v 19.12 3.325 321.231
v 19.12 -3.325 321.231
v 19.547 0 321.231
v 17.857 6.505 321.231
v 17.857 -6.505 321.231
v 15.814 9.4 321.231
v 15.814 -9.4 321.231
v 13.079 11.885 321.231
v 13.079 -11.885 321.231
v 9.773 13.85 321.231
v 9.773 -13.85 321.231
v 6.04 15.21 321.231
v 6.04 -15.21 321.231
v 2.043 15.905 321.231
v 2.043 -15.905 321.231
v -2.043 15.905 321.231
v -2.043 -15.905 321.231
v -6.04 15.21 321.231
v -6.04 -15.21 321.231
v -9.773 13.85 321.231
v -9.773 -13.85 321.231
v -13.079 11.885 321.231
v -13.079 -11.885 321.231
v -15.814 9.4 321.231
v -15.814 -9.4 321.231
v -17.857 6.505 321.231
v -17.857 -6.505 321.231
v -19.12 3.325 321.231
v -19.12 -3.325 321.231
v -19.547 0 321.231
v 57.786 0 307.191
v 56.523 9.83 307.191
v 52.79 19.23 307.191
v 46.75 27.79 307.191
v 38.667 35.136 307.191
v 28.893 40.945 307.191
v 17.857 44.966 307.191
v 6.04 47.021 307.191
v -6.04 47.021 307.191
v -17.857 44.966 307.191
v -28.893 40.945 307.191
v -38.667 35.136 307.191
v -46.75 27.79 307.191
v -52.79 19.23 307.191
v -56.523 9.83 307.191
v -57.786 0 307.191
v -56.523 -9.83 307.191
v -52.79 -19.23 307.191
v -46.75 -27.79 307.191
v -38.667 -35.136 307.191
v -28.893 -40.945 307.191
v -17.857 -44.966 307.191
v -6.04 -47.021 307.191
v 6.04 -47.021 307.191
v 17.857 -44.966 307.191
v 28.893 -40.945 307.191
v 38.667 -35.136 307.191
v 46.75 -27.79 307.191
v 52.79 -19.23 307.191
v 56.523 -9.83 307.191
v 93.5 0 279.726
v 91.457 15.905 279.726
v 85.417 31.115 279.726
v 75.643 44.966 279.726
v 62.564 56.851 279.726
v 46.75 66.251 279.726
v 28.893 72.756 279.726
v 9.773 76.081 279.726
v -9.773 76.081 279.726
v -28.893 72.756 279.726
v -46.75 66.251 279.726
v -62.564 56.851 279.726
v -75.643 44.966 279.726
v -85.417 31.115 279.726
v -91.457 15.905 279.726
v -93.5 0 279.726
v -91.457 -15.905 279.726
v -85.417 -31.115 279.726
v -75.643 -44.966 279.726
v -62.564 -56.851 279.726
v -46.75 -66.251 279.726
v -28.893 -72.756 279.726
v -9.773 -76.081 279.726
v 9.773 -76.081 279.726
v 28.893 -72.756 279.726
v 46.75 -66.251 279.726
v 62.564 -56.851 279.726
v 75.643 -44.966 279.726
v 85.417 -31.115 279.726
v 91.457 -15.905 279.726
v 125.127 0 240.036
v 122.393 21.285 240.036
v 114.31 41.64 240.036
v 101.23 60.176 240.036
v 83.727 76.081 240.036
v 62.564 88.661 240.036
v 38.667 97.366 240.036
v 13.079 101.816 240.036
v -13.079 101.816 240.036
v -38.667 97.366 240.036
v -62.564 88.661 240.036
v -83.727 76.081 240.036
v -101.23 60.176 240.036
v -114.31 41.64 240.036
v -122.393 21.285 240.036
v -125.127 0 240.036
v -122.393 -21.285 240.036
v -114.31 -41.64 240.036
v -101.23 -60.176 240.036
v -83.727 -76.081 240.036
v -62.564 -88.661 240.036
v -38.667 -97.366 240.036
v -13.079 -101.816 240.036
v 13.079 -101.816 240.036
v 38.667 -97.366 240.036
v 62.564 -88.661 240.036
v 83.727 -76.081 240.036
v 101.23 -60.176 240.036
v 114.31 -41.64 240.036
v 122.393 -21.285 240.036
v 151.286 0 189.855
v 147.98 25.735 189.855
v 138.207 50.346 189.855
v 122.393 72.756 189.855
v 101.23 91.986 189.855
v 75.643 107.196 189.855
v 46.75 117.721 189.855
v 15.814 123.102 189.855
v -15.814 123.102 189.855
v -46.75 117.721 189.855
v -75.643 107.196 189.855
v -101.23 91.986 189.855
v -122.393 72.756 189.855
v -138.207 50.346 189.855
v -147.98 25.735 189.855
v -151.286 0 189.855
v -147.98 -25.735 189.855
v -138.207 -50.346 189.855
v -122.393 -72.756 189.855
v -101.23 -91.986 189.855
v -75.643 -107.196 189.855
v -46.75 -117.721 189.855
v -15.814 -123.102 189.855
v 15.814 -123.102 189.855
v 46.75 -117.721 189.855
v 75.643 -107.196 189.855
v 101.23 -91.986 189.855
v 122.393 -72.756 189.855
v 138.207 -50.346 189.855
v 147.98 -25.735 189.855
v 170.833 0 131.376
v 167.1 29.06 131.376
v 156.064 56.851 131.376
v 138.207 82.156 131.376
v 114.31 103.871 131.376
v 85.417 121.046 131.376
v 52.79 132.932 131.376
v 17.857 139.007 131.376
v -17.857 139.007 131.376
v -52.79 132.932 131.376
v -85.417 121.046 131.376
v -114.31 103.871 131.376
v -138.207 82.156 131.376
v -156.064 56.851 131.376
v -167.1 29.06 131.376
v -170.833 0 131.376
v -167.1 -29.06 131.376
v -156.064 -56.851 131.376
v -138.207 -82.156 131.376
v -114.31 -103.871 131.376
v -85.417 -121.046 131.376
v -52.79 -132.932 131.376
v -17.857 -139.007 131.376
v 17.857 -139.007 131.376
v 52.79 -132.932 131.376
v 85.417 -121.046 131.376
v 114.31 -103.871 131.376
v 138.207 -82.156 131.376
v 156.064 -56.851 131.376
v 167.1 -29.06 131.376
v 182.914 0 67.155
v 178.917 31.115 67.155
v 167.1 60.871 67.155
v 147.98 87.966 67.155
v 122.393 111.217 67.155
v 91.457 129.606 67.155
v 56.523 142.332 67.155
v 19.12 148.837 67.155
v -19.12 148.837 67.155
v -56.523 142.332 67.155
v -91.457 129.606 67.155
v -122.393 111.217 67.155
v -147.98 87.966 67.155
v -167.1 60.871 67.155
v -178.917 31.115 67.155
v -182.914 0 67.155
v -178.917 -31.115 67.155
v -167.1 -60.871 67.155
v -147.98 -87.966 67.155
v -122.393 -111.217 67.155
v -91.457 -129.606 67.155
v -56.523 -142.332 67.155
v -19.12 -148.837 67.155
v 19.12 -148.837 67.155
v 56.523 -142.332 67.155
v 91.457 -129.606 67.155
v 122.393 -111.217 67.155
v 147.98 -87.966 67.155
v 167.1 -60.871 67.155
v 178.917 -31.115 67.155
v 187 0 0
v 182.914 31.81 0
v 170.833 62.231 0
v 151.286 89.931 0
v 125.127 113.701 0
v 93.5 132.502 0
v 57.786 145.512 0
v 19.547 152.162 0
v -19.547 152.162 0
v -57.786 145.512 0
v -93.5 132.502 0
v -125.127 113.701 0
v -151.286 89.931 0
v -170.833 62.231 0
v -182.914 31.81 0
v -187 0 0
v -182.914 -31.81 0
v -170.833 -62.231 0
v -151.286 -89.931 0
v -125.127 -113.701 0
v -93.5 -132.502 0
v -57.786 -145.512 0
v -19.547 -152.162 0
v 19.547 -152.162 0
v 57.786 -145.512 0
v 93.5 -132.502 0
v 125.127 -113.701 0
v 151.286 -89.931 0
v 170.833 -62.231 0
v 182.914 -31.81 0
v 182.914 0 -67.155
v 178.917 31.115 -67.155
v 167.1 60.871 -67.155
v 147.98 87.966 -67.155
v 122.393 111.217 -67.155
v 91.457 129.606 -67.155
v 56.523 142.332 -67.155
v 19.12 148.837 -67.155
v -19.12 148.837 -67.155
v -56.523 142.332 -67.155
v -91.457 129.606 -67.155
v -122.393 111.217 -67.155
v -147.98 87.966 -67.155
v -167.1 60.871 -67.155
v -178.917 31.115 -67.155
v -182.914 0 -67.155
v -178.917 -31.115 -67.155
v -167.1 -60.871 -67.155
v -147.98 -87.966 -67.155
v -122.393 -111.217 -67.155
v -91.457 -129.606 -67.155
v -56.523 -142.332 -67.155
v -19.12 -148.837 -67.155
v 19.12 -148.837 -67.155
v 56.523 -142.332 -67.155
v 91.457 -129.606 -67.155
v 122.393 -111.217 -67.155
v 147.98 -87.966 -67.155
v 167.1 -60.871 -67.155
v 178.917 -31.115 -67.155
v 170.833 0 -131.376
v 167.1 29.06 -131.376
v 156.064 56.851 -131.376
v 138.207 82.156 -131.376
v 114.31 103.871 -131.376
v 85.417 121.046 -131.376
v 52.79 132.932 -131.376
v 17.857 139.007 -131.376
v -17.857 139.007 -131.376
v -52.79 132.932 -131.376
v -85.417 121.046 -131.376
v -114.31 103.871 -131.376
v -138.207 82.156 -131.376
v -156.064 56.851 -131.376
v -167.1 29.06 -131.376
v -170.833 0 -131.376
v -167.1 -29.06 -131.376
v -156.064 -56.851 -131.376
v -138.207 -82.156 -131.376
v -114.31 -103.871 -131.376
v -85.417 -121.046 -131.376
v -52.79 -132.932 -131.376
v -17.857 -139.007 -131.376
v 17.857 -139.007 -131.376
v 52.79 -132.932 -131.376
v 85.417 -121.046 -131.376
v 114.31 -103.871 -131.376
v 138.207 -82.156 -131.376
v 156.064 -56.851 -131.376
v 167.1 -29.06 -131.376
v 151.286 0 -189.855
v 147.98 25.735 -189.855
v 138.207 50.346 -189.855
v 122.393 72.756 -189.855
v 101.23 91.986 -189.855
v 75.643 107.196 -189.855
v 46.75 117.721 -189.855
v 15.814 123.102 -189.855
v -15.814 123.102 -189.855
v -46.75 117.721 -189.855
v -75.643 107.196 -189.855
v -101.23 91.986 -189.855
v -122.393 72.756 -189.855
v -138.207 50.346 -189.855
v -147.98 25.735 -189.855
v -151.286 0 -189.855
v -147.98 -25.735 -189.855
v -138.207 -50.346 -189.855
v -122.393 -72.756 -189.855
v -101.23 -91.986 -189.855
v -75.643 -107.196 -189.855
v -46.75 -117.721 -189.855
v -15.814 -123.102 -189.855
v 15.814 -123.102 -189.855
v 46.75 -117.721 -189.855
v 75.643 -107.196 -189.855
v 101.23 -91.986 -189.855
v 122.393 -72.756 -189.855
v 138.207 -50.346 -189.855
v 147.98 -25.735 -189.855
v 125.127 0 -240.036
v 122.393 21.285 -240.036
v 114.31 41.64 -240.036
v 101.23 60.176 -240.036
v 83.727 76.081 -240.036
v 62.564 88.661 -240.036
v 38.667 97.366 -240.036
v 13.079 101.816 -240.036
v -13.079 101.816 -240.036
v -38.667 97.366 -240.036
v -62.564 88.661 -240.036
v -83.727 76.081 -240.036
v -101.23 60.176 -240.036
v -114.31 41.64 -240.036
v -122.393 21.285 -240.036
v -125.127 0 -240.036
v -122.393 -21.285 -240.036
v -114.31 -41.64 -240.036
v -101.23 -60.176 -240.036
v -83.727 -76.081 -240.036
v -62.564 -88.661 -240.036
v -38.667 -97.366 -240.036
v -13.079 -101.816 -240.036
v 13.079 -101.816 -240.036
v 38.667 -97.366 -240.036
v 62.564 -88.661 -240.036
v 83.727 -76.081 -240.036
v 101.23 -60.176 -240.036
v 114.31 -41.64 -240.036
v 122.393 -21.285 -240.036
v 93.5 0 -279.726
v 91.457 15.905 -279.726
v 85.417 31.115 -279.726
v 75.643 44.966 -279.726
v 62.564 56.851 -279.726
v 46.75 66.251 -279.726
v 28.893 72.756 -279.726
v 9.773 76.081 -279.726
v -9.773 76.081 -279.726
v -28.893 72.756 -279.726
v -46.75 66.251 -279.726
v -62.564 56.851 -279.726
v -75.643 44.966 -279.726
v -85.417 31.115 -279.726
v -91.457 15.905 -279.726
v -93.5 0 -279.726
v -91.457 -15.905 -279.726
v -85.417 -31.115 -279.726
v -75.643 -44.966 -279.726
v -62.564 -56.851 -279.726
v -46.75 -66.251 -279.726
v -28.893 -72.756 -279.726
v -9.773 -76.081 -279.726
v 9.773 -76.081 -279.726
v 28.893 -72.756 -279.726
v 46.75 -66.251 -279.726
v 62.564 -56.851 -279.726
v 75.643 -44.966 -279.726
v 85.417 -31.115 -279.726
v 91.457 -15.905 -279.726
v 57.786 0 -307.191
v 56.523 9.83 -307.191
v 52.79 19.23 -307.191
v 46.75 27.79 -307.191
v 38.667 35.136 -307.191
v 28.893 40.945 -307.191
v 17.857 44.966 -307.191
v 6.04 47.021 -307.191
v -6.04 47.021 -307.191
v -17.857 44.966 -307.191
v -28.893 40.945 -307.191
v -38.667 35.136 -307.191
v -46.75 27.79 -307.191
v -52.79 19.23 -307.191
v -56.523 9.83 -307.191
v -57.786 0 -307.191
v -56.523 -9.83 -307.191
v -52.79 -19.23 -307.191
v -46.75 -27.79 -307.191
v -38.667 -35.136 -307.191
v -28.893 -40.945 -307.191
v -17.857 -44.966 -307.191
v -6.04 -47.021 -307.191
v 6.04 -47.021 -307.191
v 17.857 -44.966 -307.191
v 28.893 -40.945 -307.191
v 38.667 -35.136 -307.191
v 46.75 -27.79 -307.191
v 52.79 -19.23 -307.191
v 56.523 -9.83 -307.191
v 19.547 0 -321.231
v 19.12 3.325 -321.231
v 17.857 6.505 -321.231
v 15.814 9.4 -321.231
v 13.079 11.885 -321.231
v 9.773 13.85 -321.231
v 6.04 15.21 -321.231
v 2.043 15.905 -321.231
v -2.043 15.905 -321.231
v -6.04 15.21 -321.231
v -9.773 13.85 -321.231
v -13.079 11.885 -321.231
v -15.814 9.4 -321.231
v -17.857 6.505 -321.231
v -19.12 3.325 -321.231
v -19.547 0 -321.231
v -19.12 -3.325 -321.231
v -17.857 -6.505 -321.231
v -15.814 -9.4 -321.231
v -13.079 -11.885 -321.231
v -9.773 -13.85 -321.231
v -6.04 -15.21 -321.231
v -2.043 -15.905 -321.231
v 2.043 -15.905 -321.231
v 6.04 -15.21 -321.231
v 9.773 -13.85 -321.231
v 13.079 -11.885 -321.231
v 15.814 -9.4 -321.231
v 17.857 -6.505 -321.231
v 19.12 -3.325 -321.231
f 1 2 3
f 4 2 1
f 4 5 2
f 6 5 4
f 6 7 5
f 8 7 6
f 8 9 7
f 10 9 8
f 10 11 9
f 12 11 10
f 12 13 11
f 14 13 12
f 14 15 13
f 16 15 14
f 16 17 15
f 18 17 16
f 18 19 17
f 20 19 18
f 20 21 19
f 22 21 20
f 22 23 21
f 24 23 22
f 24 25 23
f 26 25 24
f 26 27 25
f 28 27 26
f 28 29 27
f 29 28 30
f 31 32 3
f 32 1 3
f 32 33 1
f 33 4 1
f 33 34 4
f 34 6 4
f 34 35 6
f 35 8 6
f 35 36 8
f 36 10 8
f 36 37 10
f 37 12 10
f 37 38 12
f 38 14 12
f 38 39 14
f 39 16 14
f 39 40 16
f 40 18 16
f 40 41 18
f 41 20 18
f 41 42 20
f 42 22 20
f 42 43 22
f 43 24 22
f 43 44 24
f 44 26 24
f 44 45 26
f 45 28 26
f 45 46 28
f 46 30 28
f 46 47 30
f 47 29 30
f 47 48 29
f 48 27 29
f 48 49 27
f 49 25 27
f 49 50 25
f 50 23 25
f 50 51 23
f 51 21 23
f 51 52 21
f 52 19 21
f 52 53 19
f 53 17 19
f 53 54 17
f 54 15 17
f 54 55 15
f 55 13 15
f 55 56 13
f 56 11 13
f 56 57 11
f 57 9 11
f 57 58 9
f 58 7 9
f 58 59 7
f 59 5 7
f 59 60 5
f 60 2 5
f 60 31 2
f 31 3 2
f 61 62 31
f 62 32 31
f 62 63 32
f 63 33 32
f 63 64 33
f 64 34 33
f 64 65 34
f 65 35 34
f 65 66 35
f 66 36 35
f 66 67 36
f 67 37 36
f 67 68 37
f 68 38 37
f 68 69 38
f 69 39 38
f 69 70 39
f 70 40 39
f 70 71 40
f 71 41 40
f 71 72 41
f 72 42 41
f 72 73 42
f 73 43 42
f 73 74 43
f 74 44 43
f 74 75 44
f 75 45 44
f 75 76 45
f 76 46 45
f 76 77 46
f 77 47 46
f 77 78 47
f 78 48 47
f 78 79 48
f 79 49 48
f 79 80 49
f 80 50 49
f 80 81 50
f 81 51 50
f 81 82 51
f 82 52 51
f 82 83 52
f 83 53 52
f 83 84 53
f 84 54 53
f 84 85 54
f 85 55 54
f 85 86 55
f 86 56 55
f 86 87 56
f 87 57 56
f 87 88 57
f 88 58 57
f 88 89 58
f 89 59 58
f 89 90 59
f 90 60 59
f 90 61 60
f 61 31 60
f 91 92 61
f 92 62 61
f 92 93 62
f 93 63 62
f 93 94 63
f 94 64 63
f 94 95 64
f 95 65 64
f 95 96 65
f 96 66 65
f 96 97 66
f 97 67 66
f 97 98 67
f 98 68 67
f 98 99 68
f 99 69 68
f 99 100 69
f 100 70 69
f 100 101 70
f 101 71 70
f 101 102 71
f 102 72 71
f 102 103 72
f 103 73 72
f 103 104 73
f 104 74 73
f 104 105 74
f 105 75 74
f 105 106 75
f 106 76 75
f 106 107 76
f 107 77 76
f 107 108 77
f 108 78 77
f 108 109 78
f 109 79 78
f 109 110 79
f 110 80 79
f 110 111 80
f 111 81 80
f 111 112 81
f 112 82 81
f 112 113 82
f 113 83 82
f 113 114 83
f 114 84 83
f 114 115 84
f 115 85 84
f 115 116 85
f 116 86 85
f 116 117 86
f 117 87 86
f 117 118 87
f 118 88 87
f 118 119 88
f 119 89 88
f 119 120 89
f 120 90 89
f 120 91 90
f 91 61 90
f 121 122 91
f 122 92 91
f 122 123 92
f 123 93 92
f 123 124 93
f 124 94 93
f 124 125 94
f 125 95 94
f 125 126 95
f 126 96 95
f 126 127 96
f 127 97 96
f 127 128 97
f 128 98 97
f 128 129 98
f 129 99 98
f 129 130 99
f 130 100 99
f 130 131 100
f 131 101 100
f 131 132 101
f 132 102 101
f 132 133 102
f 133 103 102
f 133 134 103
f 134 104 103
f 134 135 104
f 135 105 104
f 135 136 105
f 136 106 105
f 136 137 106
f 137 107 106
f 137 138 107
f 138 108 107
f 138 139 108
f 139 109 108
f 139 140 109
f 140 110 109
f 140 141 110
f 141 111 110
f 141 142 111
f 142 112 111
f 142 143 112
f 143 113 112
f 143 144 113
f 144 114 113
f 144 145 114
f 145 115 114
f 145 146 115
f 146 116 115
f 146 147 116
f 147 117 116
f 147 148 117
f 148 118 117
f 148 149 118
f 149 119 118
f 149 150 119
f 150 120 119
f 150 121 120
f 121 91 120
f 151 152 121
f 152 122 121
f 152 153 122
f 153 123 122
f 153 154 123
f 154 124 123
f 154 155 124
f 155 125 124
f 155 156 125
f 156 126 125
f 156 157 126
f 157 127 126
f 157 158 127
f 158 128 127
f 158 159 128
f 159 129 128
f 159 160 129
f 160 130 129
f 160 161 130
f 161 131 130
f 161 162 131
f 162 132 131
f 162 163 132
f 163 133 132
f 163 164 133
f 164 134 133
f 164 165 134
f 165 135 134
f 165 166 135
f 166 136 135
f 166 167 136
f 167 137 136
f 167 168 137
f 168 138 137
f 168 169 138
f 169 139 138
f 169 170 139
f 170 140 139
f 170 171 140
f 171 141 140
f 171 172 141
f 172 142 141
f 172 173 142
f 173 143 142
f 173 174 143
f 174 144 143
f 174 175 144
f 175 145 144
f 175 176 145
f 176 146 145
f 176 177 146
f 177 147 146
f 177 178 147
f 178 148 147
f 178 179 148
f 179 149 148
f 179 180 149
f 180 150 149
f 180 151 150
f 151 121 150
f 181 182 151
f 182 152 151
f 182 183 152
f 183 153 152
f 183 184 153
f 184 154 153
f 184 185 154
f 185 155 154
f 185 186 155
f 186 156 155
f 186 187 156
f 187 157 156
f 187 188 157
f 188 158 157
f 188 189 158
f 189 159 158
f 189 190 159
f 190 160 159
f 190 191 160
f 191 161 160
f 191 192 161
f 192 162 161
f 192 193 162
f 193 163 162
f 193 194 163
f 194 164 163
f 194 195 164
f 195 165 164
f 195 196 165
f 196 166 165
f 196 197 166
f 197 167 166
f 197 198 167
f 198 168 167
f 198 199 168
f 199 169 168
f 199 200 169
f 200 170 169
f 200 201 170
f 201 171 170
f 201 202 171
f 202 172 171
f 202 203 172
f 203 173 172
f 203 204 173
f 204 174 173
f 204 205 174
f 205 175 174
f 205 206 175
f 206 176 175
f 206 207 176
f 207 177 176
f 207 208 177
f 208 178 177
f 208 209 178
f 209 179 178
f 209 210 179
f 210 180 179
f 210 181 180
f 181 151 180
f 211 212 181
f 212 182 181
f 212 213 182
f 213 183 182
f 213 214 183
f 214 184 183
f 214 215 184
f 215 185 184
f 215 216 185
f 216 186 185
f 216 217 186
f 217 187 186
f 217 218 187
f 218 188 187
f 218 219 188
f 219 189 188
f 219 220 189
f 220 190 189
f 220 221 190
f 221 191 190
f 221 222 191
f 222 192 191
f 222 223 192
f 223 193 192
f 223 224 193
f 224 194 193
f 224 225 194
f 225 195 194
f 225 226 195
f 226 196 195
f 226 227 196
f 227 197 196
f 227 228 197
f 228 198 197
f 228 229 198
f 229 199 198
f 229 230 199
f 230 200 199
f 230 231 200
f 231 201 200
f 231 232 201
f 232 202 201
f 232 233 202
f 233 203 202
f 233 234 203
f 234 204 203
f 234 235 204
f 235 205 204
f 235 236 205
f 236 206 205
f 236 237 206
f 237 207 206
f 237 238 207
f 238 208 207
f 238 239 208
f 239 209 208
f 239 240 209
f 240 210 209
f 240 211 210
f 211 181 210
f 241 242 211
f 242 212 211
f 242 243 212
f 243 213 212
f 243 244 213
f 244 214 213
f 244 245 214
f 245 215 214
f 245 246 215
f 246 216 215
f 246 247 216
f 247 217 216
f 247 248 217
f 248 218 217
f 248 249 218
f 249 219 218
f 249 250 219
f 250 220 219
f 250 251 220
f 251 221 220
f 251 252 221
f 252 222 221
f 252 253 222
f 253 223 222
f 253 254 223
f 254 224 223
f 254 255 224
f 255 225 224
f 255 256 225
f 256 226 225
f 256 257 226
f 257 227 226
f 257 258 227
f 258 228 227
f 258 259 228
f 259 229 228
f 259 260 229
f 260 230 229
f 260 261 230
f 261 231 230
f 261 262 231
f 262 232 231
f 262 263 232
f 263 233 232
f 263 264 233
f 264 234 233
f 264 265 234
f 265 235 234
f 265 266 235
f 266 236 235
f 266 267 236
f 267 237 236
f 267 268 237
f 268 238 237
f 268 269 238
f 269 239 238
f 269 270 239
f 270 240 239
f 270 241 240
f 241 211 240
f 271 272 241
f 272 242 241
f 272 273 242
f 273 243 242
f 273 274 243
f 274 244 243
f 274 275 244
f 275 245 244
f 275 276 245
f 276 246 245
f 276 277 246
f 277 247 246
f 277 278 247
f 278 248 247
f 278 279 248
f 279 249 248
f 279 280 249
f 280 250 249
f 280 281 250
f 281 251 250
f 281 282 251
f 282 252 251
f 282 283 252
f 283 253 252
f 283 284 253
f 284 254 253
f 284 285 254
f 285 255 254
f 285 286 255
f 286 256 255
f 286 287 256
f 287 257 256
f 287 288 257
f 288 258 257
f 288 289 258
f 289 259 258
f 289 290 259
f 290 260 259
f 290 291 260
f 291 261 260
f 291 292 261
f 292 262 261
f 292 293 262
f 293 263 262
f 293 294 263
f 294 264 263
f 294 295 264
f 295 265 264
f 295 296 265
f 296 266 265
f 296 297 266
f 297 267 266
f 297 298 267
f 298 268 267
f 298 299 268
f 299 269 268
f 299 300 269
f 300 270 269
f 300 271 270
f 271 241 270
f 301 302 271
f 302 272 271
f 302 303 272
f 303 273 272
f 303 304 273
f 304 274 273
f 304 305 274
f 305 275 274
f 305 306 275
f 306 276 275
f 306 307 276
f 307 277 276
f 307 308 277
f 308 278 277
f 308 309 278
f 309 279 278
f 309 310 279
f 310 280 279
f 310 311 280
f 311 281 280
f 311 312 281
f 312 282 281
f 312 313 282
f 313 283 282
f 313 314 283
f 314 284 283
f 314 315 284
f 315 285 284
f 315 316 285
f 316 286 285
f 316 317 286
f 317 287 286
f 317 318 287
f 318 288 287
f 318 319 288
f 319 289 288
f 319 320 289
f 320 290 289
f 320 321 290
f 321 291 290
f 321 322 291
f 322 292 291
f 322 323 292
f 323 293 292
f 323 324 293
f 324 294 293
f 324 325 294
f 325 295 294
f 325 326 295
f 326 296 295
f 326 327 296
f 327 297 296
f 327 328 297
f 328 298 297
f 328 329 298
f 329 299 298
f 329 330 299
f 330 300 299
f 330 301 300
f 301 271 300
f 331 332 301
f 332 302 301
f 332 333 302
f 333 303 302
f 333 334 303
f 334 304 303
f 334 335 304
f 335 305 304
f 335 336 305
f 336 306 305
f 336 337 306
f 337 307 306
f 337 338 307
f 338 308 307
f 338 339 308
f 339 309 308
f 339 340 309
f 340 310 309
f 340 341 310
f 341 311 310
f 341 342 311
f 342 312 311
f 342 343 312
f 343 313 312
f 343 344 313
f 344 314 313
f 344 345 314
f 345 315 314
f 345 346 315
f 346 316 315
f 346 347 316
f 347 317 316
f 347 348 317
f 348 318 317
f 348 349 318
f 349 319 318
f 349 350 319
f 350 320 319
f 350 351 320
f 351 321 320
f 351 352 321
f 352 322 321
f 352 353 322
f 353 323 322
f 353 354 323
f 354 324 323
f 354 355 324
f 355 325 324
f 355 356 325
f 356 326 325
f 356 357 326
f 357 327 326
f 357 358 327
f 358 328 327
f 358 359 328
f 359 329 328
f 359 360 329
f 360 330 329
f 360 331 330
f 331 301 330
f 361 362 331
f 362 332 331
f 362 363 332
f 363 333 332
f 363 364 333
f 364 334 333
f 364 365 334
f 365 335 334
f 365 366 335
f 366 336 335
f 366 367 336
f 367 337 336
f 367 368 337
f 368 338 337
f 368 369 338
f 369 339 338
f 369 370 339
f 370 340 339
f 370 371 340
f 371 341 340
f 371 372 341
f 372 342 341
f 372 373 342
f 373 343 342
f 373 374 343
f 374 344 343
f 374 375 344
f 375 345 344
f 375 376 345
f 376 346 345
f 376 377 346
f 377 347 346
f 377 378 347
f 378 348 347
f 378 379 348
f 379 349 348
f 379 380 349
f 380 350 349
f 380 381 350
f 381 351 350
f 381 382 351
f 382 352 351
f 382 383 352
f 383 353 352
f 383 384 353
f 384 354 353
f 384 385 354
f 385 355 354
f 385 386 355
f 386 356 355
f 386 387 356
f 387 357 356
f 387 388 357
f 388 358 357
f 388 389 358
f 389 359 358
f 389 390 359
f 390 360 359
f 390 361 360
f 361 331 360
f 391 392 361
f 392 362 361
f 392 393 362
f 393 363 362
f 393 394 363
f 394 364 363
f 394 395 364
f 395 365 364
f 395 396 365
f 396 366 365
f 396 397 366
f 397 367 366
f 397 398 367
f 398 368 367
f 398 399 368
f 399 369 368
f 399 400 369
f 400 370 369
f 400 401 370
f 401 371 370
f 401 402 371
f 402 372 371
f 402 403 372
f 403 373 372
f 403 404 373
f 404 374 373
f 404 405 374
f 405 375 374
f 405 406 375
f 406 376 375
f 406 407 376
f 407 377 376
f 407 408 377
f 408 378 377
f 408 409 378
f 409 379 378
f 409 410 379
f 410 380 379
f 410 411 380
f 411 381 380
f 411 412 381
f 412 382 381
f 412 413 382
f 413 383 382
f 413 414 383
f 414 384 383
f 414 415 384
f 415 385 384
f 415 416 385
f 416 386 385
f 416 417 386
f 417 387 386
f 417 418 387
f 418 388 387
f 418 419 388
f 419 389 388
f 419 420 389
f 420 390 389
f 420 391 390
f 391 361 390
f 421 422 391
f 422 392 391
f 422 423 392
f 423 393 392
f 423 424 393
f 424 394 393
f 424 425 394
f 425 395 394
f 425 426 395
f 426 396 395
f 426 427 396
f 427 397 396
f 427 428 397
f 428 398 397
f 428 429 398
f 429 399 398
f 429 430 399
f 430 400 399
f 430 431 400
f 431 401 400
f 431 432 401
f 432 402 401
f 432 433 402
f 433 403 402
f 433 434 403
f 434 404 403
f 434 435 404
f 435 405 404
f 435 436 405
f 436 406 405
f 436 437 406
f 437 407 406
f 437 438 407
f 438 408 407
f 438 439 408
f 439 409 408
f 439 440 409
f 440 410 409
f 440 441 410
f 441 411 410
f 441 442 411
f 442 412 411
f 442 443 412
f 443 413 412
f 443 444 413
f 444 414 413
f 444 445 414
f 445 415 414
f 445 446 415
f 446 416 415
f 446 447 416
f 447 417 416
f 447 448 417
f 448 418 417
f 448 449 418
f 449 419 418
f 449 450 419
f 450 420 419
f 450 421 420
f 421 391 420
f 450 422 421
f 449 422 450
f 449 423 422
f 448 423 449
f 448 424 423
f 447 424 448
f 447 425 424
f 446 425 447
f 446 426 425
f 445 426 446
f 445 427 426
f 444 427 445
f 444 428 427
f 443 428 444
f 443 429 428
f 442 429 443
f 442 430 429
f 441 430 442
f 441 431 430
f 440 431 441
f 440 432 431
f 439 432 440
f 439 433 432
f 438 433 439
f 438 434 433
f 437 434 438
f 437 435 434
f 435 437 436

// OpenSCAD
// Generated by SolidPython 1.0.1 on 2020-07-29 00:46:49


scale(v = [11, 9, 19]) {
	sphere(r = 17);
}
/***********************************************
*********      SolidPython code:      **********
************************************************
 
# import packages: SolidPython
from solid import *
from solid.utils import *
from itertools import chain, combinations, permutations


class Resize:

    def __init__(self, scad_file):
        self.scad_file = scad_file
        #self.scad_file = import_scad(scad_file)
        # cone/cylinder param:
        self.r1 = 0
        self.r2 = 0
        self.h = 0
        # rectangular prism param:
        self.w = 0
        self.l = 0
        # ellipse param:
        self.r = 0

    # import OpenScad code (file name corresponds to shape)


    # classify shape + parameters
    def assign(self, param1, param2, param3):
        if self.scad_file == 'cone.scad':
            self.r1 = param1
            self.r2 = param2
            self.h = param3
        elif self.scad_file == 'cylinder.scad':
            self.r1 = param1
            self.r2 = param2
            self.h = param3
        elif self.scad_file == 'rectangularPrism.scad':
            self.h = param1
            self.l = param2
            self.w = param3
        else:
            self.r = param1
            self.h = param2

    # resize parameters
    def iterate(self):
        x = range(3, 20, 2)
        i = 1
        if self.scad_file == 'cone.scad':
            tempList = list(permutations(x, 2))
            for temp in tempList:
                param1 = temp[0]
                param2 = temp[1]
                filepath = 'produced_scad_files/' + 'cone' + str(param1) + '_' + str(param2) + '_' + '.scad'
                scad_render_to_file(cylinder(h=param1, r1=param2, r2=0), filepath)

        elif self.scad_file == 'cylinder.scad':
            tempList = list(permutations(x, 3))
            for temp in tempList:
                param1 = temp[0]
                param2 = temp[1]
                filepath = 'produced_scad_files/' + 'cylinder' + str(param1) + '_' + str(param2) + '_' + '.scad'
                scad_render_to_file(cylinder(h=param1, r1=param2, r2=param2), filepath)

        elif self.scad_file == 'rectangularPrism.scad':
            tempList = list(permutations(x, 3))
            for temp in tempList:
                param1 = temp[0]
                param2 = temp[1]
                param3 = temp[2]
                filepath = 'produced_scad_files/' + 'rectangularPrism' + str(param1) + '_' + str(param2) + '_' + str(
                    param3) + '.scad'
                scad_render_to_file(cube(size=(param1, param2, param3)), filepath)

        elif self.scad_file == 'ellipse.scad':
            tempList = list(permutations(x, 4))
            for temp in tempList:
                param1 = temp[0]
                param2 = temp[1]
                param3 = temp[2]
                param4 = temp[3]
                filepath = 'produced_scad_files/' + 'ellipse' + str(param1) + '_' + str(param2) + '_' + str(param3) + '_' + str(param4) + '.scad'
                scad_render_to_file(scale([param1, param2, param3])(sphere(r=param4)), filepath)

    def render_to_scadfile(self):
        scad_render_to_file(scad, 'example.scad') 
 
************************************************/
